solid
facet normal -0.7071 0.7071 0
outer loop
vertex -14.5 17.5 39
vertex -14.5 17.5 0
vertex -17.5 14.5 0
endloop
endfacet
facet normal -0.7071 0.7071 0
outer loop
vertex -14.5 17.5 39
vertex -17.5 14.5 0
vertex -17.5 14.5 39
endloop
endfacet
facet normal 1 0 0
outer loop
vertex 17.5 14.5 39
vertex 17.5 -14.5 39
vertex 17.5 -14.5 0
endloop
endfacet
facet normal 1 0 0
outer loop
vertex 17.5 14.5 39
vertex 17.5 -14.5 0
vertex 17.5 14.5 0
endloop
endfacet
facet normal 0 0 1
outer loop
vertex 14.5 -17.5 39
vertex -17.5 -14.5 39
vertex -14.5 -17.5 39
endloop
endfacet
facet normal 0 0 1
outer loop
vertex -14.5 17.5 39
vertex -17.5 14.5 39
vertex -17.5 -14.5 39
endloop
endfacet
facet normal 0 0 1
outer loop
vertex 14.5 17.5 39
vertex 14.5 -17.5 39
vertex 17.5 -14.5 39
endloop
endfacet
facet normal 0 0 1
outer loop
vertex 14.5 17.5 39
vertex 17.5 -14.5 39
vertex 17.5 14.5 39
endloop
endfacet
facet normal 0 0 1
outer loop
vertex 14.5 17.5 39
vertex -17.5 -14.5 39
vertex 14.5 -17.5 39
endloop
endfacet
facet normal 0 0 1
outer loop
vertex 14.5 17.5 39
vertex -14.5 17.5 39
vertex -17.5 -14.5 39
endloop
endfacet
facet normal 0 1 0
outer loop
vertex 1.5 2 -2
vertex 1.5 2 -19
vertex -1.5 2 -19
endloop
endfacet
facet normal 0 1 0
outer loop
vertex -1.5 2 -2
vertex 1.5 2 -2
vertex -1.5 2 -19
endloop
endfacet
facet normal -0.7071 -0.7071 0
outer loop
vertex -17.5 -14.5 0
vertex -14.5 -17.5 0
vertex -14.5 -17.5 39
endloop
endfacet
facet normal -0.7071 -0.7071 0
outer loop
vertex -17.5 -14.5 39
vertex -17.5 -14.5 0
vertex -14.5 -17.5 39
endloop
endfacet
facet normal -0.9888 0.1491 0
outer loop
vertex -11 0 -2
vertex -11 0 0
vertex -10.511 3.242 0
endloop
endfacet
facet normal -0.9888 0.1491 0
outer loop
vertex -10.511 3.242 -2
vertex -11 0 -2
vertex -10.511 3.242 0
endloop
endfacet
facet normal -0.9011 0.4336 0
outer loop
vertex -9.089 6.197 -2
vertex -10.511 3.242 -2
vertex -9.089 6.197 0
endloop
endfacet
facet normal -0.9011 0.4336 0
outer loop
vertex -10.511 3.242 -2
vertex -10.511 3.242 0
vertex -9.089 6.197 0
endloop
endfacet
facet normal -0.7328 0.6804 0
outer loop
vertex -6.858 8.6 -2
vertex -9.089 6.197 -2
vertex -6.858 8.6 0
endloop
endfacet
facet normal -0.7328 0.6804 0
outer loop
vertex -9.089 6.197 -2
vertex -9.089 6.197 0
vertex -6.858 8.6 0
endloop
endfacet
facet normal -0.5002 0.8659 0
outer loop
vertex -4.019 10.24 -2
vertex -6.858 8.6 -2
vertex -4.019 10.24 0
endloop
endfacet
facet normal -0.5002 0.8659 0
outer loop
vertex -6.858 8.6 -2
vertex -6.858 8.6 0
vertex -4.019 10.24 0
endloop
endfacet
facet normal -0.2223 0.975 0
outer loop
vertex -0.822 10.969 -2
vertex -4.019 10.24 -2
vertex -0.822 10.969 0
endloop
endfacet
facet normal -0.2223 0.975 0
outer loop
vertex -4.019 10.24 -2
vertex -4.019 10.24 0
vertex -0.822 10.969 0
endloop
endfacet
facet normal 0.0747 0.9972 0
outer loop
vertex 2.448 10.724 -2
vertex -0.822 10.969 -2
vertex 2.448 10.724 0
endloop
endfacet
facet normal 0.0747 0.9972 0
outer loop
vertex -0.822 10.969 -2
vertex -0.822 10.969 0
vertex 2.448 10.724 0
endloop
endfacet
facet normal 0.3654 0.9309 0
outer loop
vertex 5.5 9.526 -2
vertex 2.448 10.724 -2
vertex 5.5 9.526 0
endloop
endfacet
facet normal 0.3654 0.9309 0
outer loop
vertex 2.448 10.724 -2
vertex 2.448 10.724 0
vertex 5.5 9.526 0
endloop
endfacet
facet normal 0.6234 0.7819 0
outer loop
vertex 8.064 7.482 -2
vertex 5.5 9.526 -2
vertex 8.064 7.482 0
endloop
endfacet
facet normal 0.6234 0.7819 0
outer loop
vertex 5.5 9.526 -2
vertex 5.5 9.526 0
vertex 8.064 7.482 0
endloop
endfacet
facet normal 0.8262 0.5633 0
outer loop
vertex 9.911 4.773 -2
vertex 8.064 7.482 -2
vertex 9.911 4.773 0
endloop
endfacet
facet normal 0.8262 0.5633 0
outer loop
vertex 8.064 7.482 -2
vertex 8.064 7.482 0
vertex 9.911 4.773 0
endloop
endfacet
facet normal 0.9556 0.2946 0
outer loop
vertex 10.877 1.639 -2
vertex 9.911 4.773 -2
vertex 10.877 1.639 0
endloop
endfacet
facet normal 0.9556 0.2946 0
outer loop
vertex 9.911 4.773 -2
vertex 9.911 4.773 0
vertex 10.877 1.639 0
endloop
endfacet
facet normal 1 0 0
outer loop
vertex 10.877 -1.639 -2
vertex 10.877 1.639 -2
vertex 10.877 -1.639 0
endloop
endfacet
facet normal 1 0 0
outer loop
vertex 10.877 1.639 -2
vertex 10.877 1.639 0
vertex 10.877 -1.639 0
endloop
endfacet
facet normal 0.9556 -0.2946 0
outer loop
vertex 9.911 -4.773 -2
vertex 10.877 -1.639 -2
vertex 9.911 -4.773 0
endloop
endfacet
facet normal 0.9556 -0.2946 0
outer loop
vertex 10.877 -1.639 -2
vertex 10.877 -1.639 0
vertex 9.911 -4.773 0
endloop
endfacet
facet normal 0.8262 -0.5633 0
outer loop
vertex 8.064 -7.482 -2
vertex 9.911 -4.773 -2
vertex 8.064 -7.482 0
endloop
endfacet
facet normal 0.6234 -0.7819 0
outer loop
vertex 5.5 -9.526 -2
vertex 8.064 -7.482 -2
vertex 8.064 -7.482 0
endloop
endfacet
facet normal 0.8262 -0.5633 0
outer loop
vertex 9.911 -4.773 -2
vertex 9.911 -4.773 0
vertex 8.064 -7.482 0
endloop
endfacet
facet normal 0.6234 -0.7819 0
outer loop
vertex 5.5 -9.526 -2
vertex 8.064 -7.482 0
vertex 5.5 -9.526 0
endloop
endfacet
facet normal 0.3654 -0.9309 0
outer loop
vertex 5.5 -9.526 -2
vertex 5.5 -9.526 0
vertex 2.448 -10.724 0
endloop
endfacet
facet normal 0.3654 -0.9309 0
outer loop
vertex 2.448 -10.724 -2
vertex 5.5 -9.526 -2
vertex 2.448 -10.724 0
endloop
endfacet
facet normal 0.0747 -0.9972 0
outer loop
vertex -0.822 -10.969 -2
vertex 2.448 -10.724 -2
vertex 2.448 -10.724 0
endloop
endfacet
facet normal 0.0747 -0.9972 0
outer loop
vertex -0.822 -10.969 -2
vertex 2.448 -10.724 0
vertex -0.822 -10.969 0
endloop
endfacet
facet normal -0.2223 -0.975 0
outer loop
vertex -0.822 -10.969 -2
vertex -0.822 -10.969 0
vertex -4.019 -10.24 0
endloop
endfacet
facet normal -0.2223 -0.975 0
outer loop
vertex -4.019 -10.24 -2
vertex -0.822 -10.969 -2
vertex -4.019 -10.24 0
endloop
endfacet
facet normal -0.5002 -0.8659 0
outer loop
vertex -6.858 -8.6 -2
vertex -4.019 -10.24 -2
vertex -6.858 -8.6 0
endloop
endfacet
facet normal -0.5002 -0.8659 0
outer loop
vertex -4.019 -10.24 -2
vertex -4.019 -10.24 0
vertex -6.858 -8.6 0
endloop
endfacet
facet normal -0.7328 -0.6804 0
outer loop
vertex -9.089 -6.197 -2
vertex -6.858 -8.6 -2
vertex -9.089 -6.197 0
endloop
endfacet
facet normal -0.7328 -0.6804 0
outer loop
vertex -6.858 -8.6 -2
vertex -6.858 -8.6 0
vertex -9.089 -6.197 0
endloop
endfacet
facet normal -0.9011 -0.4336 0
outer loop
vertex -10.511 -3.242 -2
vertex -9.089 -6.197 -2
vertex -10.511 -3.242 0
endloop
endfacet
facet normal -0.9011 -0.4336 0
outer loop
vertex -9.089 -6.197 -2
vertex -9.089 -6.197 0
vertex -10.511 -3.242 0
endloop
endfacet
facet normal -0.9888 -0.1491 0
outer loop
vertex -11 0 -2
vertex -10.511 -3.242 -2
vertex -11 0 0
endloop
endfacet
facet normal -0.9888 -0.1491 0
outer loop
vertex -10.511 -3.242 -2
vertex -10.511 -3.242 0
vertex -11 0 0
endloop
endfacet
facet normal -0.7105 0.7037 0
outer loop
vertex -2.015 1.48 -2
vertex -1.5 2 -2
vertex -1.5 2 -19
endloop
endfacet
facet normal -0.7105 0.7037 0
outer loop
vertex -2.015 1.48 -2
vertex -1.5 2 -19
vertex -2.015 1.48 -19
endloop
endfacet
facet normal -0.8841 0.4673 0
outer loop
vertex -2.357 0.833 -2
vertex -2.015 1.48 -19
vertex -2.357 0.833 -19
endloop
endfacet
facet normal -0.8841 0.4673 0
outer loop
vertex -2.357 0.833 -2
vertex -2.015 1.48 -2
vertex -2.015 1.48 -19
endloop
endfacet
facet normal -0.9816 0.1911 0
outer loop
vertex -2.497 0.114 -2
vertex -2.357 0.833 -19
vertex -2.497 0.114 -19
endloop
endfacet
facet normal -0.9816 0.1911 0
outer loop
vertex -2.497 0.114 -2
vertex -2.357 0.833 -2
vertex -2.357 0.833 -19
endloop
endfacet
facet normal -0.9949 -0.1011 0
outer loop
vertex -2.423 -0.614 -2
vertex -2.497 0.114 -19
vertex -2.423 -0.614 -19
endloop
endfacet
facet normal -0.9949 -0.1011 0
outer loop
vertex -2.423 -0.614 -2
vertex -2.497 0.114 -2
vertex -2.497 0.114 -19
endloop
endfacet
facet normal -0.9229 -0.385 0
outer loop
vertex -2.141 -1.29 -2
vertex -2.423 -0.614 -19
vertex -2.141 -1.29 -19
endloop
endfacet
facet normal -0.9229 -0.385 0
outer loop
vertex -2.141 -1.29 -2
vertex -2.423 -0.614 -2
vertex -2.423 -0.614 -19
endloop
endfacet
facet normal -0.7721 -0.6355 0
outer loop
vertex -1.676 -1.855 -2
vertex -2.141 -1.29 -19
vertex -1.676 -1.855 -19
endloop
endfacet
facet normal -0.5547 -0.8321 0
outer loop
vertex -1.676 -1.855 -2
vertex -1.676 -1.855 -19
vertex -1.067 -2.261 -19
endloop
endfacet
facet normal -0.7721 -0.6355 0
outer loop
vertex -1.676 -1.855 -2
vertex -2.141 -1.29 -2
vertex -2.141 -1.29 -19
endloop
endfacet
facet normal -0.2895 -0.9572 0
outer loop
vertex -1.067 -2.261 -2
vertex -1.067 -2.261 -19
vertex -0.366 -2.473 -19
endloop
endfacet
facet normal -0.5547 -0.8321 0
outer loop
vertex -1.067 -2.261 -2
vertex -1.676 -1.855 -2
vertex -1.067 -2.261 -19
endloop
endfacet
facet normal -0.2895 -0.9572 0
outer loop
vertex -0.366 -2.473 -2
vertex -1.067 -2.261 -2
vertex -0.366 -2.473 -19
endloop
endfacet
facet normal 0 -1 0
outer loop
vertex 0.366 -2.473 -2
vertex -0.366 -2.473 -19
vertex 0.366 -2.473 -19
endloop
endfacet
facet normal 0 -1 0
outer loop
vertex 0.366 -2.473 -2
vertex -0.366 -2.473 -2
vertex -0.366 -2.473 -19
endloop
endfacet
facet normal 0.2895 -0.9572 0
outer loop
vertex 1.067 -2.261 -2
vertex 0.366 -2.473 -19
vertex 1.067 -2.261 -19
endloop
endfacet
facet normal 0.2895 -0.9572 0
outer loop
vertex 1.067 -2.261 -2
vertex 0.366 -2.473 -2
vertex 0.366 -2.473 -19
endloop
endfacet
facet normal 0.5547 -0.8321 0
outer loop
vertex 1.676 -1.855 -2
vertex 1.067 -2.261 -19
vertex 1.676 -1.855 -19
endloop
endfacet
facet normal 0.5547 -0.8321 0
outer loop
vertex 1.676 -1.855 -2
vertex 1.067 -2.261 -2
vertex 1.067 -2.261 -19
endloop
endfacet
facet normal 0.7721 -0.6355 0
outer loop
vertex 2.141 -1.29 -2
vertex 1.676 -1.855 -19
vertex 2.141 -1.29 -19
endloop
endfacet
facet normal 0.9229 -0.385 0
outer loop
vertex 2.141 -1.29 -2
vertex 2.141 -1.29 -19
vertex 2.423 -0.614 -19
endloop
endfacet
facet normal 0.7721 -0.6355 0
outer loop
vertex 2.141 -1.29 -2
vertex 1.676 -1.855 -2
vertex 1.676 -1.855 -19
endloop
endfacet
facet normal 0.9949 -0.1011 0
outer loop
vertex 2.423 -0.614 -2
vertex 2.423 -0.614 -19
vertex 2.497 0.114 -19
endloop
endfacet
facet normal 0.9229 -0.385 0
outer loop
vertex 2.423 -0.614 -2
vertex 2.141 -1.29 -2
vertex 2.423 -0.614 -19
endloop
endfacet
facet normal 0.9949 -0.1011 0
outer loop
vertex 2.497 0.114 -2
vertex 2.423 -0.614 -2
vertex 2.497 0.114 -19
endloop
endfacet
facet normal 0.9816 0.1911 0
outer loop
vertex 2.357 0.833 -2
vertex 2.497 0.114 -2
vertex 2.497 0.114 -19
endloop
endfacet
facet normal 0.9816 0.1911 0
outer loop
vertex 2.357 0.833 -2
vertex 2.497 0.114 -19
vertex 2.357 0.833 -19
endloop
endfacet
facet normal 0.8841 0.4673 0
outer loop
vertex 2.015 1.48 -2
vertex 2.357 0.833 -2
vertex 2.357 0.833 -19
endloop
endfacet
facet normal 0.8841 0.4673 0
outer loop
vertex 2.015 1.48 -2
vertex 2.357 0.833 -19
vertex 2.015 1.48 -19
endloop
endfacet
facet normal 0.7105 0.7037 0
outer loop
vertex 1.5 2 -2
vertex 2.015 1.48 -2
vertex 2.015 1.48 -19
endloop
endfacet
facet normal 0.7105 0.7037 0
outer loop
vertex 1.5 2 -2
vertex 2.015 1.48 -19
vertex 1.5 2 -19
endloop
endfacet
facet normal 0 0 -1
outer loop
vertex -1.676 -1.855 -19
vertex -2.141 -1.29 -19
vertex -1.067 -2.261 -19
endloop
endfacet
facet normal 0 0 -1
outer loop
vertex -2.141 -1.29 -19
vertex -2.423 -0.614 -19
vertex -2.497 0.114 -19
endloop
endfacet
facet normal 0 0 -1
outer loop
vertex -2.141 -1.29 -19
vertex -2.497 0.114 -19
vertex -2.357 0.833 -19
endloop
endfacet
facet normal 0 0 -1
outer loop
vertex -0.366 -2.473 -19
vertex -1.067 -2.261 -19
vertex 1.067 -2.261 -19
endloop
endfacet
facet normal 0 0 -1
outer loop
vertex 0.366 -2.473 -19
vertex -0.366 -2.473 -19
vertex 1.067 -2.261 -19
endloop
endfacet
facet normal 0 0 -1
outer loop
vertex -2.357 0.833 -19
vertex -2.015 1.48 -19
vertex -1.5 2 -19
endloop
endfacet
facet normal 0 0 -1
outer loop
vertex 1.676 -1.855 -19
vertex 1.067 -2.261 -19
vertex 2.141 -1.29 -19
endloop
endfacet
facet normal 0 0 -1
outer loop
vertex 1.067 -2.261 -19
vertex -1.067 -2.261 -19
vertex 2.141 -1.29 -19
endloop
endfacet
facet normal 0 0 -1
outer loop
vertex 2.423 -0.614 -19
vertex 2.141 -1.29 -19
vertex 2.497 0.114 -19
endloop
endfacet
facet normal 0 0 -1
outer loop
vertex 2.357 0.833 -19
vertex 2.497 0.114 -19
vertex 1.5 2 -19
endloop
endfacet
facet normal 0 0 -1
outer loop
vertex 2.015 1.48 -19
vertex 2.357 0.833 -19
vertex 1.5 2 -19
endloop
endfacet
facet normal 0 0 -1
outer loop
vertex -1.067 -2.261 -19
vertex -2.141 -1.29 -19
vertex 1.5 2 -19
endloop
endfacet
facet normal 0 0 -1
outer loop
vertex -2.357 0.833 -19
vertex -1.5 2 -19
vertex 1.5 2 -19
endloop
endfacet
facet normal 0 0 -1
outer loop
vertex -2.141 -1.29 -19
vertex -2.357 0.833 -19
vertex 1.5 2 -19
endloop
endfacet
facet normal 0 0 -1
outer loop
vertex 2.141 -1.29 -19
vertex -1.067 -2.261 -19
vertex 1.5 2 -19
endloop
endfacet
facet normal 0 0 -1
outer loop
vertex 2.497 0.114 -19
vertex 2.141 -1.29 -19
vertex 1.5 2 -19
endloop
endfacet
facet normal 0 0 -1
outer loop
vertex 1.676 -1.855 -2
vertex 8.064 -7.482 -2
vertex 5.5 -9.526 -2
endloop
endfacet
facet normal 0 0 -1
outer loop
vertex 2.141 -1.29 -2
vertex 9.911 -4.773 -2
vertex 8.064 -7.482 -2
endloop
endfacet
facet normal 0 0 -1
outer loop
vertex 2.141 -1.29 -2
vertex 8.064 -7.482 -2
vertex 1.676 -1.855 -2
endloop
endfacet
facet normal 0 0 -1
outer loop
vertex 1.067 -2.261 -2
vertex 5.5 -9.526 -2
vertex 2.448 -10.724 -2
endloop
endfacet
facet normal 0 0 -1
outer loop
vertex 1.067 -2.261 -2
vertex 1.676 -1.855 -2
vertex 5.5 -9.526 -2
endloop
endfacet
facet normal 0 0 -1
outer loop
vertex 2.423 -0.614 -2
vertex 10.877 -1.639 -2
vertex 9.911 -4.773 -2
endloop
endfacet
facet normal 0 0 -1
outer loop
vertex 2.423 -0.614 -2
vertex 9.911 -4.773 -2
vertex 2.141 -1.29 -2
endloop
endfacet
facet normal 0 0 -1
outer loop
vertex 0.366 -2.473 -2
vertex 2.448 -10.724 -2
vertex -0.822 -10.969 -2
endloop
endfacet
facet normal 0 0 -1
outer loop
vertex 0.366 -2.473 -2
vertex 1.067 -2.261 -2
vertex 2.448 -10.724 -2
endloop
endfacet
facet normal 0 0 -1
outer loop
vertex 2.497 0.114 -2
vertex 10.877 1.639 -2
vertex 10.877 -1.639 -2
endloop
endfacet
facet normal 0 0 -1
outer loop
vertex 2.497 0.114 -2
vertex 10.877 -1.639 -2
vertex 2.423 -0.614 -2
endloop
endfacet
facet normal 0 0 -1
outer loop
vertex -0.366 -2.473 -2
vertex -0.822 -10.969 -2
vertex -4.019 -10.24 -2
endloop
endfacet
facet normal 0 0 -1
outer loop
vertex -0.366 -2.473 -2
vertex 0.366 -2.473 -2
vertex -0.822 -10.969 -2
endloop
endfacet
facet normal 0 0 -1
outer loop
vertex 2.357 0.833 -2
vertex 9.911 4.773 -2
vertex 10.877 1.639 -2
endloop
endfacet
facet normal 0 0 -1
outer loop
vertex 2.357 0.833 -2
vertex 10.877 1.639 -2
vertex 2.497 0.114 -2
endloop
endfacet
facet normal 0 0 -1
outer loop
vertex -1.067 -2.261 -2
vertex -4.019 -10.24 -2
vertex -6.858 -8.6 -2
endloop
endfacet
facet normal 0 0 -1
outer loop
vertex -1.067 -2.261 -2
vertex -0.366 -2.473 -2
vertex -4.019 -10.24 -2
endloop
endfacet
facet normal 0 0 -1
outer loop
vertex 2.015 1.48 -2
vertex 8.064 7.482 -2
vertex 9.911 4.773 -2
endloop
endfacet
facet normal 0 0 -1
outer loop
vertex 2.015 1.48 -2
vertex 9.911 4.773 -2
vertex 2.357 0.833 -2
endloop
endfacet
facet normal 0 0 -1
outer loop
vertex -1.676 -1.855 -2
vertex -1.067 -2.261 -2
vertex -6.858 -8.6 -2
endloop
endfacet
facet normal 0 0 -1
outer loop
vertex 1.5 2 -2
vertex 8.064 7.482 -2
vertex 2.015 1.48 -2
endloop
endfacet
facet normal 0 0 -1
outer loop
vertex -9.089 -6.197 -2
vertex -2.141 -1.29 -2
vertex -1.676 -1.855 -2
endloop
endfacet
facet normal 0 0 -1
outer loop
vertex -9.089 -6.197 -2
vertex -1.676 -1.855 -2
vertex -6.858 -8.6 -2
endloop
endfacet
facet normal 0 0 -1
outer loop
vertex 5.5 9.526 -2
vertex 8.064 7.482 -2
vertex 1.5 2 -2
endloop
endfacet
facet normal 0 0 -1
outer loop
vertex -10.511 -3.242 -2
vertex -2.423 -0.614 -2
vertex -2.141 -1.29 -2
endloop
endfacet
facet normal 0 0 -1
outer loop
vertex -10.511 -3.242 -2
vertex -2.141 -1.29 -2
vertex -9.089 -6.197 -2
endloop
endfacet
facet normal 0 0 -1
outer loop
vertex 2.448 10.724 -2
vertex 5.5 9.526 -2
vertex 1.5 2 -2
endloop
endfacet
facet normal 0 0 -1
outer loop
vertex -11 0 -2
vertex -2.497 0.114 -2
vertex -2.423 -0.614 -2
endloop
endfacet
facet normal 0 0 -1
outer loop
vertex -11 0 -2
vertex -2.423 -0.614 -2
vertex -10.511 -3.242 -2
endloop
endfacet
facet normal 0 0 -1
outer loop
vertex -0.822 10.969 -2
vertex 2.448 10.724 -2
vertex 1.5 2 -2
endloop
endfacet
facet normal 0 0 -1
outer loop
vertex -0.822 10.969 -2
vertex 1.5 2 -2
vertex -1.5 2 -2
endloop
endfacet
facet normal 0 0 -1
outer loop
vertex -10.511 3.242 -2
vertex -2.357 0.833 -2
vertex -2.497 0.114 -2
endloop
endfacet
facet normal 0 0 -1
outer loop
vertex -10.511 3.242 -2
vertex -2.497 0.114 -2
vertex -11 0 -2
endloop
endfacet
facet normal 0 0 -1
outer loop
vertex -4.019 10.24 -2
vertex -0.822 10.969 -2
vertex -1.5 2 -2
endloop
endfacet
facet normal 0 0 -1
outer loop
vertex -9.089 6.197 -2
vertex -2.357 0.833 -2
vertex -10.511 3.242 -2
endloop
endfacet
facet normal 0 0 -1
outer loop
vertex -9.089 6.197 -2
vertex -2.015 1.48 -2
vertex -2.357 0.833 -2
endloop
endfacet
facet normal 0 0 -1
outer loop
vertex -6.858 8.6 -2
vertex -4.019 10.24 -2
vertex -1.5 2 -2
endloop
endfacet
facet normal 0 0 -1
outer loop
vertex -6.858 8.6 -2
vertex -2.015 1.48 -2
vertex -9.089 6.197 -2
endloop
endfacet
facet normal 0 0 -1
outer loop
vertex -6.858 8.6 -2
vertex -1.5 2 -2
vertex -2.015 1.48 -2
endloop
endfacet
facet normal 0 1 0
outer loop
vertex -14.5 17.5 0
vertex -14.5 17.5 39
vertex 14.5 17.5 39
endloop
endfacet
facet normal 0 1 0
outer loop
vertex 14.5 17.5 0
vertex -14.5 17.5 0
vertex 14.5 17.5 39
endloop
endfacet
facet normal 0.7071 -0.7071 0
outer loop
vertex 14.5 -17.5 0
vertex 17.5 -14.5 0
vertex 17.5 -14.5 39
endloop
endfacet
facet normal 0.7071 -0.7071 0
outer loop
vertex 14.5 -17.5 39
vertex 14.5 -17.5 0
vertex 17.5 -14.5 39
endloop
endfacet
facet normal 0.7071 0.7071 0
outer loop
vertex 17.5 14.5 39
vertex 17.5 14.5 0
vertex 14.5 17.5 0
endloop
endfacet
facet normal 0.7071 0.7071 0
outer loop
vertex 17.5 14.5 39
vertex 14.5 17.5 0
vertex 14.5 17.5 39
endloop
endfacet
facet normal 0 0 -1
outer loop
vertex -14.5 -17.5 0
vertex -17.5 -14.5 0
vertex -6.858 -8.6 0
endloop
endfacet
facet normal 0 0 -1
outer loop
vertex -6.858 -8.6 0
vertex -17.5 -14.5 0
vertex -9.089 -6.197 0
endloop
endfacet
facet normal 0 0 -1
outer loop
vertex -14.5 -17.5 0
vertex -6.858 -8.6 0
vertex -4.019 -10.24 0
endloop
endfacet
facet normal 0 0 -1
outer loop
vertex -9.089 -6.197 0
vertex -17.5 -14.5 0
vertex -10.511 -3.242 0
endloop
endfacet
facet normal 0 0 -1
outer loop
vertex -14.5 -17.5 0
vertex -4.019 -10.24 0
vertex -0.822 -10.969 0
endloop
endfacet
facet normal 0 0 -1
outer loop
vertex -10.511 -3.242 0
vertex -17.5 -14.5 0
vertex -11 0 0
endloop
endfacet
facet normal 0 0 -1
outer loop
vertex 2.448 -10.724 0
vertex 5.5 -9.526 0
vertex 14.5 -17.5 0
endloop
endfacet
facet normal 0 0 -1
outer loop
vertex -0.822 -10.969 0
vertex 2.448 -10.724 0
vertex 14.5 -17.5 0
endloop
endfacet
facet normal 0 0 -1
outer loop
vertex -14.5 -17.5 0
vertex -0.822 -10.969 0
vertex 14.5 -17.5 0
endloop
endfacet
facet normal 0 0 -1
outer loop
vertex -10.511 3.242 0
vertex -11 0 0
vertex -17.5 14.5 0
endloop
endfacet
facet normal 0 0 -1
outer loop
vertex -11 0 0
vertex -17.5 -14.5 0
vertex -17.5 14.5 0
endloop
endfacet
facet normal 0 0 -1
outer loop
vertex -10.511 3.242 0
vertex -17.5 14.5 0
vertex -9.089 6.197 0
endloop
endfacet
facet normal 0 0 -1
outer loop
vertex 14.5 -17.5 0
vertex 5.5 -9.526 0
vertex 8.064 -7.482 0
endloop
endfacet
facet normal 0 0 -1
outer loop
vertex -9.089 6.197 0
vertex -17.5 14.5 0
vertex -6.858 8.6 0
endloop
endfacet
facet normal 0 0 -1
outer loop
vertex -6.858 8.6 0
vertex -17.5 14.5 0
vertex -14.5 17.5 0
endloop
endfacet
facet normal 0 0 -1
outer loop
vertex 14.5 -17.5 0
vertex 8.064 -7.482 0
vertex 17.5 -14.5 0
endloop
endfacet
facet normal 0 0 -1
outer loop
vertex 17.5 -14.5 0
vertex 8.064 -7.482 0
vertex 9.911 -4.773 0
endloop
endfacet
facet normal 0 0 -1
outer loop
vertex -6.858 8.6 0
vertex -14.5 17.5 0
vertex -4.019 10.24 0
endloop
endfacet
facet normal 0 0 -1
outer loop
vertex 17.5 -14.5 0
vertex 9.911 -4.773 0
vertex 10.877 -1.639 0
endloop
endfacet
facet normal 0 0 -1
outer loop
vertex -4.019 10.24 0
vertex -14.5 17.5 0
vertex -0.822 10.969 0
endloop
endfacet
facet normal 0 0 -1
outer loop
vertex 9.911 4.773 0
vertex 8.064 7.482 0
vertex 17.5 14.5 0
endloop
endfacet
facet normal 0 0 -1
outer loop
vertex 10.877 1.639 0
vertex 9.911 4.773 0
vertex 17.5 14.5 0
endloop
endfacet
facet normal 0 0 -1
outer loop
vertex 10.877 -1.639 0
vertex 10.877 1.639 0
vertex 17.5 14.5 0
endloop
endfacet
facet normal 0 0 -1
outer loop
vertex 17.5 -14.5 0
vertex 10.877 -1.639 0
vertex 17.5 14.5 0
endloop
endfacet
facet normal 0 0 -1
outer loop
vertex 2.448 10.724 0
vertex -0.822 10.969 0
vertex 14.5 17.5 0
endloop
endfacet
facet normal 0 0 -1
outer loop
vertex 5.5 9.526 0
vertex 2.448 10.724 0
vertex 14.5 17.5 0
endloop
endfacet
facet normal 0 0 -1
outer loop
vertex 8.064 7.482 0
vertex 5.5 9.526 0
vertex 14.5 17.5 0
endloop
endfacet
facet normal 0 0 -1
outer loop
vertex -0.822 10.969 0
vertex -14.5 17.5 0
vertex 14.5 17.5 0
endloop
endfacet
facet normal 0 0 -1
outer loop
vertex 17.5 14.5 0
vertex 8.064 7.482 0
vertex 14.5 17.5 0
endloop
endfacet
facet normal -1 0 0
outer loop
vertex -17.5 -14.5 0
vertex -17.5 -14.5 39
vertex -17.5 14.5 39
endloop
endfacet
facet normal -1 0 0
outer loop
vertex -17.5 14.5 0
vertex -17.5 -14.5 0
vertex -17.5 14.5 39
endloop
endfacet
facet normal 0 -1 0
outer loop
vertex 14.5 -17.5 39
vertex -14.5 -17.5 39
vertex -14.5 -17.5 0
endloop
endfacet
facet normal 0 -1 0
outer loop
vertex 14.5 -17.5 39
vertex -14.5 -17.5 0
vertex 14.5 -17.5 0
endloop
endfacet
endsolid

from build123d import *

# Parameters (mm, degrees)
SKETCH_1_W      = 35
SKETCH_1_H      = 35
EXTRUDE_1_DEPTH = 39
SKETCH_2_R      = 11
EXTRUDE_2_DEPTH = 2
EXTRUDE_3_DEPTH = 17
CHAMFER_1_SIZE  = 3


with BuildPart() as part:
    # 草图1 → 凸台-拉伸1 (new body)
    with BuildSketch(Plane.XY):
        Rectangle(SKETCH_1_W, SKETCH_1_H)
    extrude(amount=EXTRUDE_1_DEPTH)

    # 草图2 → 凸台-拉伸2 (add)
    with BuildSketch(Plane(origin=(0, 0, 0), x_dir=(-1, 0, 0), z_dir=(0, 0, -1))):
        Circle(SKETCH_2_R)
    extrude(amount=EXTRUDE_2_DEPTH)

    # 草图3 → 凸台-拉伸3 (add)
    with BuildSketch(Plane(origin=(0, 0, -2), x_dir=(-1, 0, 0), z_dir=(0, 0, -1))):
        with BuildLine():
            Line((-1.5, 2), (1.5, 2))
            ThreePointArc((1.5, 2), (0, -2.5), (-1.5, 2))
        make_face()
    extrude(amount=EXTRUDE_3_DEPTH)

    # 倒角1
    chamfer_1_edges = [part.edges().sort_by_distance(p)[0] for p in [
        (17.5, -17.5, 19.5),
        (-17.5, -17.5, 19.5),
        (-17.5, 17.5, 19.5),
        (17.5, 17.5, 19.5),
    ]]
    chamfer(chamfer_1_edges, length=CHAMFER_1_SIZE)


solid = part.part
